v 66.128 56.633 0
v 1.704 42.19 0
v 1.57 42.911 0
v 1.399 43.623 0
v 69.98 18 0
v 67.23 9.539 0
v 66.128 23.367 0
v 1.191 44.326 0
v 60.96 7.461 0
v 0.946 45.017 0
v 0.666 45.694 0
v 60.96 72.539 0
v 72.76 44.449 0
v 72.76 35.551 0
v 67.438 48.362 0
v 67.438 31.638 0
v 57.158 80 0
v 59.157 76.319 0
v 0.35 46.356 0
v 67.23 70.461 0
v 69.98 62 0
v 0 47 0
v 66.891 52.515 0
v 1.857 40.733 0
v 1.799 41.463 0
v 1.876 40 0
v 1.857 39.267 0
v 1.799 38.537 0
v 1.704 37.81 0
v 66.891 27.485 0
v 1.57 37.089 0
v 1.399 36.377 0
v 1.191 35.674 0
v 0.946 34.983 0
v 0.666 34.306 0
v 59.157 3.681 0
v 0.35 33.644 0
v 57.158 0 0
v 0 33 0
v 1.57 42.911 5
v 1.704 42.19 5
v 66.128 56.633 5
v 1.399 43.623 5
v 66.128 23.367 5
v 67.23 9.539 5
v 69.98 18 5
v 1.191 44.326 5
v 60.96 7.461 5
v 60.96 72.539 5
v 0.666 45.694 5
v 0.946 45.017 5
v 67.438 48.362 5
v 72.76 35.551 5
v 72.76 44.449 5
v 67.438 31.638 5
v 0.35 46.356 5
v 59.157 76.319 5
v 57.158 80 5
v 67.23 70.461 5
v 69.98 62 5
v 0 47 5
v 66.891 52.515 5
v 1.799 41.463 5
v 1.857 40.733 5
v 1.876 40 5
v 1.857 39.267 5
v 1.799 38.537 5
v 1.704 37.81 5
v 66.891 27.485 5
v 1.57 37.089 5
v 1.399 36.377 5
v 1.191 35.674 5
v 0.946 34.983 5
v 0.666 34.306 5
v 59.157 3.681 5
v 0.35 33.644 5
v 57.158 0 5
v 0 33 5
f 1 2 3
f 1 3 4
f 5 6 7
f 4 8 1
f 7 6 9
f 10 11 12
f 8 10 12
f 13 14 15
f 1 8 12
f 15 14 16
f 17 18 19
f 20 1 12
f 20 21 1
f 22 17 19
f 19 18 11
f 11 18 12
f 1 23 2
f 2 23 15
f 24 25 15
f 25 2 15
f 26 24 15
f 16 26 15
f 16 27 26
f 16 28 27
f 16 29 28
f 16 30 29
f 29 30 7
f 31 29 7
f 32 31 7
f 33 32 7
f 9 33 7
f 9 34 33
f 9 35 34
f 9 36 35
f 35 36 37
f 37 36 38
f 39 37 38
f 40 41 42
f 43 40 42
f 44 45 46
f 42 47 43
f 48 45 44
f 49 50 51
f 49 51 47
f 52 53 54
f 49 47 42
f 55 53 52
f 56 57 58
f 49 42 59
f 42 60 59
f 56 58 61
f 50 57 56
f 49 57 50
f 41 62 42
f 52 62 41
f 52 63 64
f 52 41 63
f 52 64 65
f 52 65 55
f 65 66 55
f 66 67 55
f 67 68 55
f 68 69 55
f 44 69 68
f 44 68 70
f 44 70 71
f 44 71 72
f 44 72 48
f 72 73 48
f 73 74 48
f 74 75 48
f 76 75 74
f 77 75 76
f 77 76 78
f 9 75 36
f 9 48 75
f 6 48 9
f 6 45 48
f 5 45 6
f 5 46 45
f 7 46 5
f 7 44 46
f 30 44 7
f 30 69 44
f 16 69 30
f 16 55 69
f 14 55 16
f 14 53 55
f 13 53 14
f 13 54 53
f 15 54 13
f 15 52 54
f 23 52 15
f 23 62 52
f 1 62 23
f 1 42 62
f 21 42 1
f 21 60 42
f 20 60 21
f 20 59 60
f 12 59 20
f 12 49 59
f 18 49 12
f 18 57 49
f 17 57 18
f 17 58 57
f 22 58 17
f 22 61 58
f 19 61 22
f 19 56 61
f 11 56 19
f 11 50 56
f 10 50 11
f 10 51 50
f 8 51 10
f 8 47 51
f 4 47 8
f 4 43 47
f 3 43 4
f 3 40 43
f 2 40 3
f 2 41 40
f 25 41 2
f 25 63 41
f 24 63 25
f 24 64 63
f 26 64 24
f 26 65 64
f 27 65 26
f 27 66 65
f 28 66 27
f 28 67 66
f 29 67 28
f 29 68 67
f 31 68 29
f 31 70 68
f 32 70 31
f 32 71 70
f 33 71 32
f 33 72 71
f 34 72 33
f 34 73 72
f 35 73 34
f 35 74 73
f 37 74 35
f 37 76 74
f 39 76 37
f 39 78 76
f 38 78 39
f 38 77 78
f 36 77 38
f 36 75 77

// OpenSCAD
$fn = 32;

// ----------------------------------------------------------------------
// Gear sector: 3 teeth on 60 degrees
// ----------------------------------------------------------------------

// --- parameters (mm) ---
sector_angle = 60;        // sector angle, degrees
root_r = 80;              // root circle radius
tooth_h = 5;              // tooth height over the root circle
teeth = 3;                // number of teeth on the sector
hub_r = 14;               // hub bore radius
plate_t = 5;              // sector thickness, Z
arc_step = 3;             // sampling step of the root/hub arcs, degrees

tip_r = root_r + tooth_h;  // tip circle radius

profile = [[57.158, 0], [59.157, 3.681], [60.96, 7.461], [67.23, 9.539], [69.98, 18], [66.128, 23.367], [66.891, 27.485], [67.438, 31.638], [72.76, 35.551], [72.76, 44.449], [67.438, 48.362], [66.891, 52.515], [66.128, 56.633], [69.98, 62], [67.23, 70.461], [60.96, 72.539], [59.157, 76.319], [57.158, 80], [0, 47], [0.35, 46.356], [0.666, 45.694], [0.946, 45.017], [1.191, 44.326], [1.399, 43.623], [1.57, 42.911], [1.704, 42.19], [1.799, 41.463], [1.857, 40.733], [1.876, 40], [1.857, 39.267], [1.799, 38.537], [1.704, 37.81], [1.57, 37.089], [1.399, 36.377], [1.191, 35.674], [0.946, 34.983], [0.666, 34.306], [0.35, 33.644], [0, 33]];  // primary outline, 39 points, counter clockwise

// --- the one profile operation ---
linear_extrude(height = plate_t) polygon(points = profile);
